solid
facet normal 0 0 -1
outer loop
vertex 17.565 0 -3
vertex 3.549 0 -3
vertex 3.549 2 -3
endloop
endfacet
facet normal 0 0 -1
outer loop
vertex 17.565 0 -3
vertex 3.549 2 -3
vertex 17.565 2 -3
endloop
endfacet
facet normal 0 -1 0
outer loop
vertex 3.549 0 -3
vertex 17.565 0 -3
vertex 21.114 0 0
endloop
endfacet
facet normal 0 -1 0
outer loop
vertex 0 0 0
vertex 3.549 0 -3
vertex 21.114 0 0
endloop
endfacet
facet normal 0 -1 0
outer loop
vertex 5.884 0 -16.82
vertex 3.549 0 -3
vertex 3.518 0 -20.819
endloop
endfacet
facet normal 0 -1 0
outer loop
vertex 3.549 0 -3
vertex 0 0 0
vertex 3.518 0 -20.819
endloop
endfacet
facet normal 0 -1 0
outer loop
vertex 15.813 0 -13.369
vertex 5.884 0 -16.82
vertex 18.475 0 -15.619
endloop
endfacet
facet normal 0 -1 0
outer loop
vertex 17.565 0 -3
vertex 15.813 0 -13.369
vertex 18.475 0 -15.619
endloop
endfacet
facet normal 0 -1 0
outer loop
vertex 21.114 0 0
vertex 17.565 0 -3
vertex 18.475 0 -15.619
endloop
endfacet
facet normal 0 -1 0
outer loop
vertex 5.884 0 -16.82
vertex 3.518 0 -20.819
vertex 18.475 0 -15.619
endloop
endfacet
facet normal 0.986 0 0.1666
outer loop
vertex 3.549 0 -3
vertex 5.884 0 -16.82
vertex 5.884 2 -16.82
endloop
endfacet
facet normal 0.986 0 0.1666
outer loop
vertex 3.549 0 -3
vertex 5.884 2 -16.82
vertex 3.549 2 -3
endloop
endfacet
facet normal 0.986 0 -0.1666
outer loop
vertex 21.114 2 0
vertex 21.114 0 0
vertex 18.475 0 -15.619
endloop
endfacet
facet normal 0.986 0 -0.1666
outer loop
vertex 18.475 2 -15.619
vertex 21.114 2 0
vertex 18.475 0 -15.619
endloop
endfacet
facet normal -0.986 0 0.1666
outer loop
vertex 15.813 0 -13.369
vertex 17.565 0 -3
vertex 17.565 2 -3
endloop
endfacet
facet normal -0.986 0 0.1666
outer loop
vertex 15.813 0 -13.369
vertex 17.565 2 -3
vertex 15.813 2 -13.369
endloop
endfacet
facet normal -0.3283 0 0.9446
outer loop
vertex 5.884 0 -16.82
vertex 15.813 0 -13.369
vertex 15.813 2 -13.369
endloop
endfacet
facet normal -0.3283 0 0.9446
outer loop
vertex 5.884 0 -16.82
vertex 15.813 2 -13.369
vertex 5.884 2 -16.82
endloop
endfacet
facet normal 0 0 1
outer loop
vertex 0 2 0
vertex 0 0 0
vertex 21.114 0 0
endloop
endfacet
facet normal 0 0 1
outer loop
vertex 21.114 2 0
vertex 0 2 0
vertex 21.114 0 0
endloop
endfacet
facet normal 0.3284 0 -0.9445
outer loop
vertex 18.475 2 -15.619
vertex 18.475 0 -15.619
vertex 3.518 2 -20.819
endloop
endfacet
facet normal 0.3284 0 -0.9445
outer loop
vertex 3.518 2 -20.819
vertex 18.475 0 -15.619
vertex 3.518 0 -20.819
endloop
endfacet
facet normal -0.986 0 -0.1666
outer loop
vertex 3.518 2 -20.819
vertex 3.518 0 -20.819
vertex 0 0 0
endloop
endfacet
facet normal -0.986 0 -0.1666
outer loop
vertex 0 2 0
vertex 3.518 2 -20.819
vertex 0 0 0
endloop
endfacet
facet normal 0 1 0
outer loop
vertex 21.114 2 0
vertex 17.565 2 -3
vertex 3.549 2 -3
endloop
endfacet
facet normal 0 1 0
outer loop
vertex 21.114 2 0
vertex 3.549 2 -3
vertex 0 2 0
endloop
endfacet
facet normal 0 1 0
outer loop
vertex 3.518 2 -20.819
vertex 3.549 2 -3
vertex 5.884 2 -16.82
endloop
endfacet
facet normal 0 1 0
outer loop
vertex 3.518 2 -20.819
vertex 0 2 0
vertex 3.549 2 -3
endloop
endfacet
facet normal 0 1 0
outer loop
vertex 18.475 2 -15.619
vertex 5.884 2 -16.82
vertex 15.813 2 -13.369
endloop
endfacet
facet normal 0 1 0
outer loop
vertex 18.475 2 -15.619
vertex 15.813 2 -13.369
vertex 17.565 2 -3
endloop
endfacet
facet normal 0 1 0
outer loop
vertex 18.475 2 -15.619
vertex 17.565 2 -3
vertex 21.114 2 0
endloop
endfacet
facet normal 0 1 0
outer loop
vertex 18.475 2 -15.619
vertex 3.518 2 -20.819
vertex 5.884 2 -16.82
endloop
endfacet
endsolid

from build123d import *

# Parameters (mm, degrees)
BOSS_EXTRUDE1_DEPTH = 2


with BuildPart() as part:
    # Sketch1 → Boss-Extrude1 (new body)
    with BuildSketch(Plane(origin=(0, 0, 0), x_dir=(1, 0, 0), z_dir=(0, 1, 0))):
        Polygon((0, 0), (21.11421446, 0), (18.47519345, 15.619407395), (3.517557511, 20.81914603), align=None)
        Polygon((5.884430734, 16.82024507), (3.549392266, 3), (17.564822194, 3), (15.812934214, 13.368789015), align=None, mode=Mode.SUBTRACT)
    extrude(amount=BOSS_EXTRUDE1_DEPTH)


solid = part.part
